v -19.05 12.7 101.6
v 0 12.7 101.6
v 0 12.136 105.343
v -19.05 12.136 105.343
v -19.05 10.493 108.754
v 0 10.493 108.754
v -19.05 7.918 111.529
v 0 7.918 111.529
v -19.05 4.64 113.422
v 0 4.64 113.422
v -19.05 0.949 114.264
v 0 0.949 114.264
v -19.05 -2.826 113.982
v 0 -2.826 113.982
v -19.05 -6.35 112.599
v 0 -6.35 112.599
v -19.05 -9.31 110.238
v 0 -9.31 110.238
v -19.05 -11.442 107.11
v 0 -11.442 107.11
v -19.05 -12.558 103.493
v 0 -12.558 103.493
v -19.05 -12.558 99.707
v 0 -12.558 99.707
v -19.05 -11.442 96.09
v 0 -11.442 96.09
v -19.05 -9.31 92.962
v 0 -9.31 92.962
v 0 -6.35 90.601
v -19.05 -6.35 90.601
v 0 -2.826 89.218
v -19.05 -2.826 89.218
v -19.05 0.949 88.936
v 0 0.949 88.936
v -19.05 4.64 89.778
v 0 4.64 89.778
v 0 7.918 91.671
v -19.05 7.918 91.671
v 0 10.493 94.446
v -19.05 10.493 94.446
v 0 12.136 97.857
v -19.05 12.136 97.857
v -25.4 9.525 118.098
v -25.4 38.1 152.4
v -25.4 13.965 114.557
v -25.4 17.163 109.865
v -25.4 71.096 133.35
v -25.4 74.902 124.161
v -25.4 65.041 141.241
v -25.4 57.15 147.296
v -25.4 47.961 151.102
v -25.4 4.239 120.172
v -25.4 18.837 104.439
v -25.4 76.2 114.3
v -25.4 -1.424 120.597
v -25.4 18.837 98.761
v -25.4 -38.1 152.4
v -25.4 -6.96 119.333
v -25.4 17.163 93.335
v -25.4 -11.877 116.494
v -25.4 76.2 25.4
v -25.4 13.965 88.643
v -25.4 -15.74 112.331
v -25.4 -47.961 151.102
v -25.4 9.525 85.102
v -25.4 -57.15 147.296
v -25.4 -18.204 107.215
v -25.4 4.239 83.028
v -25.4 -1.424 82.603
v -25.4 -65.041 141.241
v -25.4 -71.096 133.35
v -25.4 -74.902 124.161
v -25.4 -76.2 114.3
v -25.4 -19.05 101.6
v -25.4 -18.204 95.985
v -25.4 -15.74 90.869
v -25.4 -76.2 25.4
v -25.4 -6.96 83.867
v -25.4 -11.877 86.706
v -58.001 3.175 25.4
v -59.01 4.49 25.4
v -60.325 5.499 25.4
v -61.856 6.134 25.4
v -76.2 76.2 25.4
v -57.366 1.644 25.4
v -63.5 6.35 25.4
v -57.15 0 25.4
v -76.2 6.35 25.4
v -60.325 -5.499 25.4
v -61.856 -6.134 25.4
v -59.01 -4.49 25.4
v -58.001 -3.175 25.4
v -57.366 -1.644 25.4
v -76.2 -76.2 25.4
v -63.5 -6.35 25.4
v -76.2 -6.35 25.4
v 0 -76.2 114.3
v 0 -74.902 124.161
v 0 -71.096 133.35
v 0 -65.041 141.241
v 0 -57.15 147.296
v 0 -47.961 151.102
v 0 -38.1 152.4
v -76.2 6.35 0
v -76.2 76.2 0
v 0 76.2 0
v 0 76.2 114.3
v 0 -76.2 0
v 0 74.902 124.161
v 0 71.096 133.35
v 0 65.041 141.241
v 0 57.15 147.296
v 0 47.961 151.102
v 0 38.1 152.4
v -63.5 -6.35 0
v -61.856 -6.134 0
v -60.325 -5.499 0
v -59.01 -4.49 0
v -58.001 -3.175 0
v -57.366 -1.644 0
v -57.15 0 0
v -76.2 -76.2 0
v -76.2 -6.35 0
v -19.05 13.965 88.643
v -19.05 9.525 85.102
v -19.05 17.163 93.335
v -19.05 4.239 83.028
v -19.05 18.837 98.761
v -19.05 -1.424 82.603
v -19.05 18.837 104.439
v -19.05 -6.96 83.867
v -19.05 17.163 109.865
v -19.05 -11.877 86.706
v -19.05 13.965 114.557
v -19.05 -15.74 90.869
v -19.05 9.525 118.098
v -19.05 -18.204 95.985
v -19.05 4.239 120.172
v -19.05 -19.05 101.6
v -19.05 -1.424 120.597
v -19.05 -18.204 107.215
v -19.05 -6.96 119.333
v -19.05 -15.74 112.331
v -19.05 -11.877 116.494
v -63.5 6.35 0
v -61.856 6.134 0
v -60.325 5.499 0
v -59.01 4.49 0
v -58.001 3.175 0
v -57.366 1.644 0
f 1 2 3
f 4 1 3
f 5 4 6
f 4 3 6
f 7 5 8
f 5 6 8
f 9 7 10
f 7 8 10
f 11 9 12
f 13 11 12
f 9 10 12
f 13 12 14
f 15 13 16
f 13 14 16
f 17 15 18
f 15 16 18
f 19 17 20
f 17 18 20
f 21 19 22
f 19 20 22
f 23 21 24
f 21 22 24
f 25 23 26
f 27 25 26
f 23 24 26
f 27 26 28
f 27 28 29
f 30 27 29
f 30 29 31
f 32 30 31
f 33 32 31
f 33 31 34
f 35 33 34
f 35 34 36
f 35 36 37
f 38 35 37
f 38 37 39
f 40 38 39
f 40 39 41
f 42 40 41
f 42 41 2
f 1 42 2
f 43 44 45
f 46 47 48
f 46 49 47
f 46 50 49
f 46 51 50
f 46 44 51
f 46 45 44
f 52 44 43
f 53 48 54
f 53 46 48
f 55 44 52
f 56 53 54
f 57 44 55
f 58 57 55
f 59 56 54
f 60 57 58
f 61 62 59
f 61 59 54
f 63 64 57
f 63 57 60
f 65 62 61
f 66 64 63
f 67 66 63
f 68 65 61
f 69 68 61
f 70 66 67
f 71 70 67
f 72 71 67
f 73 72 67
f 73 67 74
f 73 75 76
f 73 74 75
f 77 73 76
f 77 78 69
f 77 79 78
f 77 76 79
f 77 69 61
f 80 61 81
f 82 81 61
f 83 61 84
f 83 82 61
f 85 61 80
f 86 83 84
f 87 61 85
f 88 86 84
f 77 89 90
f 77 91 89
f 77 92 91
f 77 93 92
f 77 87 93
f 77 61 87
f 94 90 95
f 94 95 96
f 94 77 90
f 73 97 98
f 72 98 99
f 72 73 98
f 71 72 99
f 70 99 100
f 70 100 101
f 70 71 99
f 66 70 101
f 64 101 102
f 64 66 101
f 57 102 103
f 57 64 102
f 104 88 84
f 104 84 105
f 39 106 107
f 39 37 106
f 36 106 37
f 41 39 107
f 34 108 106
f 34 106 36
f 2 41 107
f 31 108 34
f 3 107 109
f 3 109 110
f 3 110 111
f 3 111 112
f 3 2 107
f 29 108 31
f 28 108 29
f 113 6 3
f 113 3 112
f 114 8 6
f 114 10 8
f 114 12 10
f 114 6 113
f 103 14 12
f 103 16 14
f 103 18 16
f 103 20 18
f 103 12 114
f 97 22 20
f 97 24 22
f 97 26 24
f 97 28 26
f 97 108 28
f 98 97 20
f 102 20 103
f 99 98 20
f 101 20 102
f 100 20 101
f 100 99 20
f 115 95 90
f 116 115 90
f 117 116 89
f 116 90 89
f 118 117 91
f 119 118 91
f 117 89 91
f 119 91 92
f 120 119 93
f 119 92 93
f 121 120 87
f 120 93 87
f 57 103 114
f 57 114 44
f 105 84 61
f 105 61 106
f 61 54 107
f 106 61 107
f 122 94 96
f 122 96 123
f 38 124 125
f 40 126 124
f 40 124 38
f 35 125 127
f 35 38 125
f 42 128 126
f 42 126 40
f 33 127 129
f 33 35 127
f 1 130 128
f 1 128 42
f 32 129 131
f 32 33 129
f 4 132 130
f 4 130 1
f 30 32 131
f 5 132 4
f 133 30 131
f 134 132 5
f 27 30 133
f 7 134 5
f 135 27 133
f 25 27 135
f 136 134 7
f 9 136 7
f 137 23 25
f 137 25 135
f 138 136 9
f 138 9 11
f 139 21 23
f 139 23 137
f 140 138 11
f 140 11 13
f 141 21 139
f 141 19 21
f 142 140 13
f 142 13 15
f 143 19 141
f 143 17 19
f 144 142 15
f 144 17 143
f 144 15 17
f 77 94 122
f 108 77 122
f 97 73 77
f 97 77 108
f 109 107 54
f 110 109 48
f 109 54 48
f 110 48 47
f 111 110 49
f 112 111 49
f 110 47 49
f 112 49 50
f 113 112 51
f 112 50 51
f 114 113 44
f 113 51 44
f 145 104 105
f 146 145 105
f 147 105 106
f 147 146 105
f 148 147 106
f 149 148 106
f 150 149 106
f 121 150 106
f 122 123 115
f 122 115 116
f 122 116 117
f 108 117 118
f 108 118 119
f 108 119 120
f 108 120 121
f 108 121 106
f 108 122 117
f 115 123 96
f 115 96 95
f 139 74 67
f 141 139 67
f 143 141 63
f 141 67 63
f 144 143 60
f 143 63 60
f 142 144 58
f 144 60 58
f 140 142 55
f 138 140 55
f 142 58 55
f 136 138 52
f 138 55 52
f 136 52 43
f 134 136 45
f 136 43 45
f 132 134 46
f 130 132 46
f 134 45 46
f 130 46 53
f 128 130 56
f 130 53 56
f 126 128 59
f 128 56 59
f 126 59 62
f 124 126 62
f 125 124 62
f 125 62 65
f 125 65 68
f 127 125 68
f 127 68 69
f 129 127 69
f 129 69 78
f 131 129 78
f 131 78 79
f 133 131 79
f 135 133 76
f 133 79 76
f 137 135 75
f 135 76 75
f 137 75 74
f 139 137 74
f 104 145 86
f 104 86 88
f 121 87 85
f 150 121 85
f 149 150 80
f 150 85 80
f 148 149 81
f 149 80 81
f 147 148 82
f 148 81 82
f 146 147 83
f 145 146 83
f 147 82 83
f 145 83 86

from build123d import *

# Parameters (mm, degrees)
F1_DEPTH = 76.2
F2_R     = 12.7
F3_DEPTH = 76.201
F5_DEPTH = 25.401
F6_R     = 38.1
F7_R     = 19.05
F8_DEPTH = 6.35


with BuildPart() as f1:
    # F0 (on Front) → F1 (new body, symmetric)
    with BuildSketch(Plane.XZ):
        Polygon((-76.2, 0), (0, 0), (0, 152.4), (-25.4, 152.4), (-25.4, 25.4), (-76.2, 25.4), align=None)
    extrude(amount=F1_DEPTH, both=True)

    # F2 (on face) → F3 (cut, through all)
    with BuildSketch(Plane.YZ):
        with Locations((0, 101.6)):
            Circle(F2_R)
    extrude(amount=-F3_DEPTH, mode=Mode.SUBTRACT)

    # F4 (on face) → F5 (cut, through all)
    with BuildSketch(Plane.XY.offset(25.4)):
        with BuildLine():
            ThreePointArc((-63.5, -6.35), (-59.009872, -4.490128), (-57.15, 0))
            ThreePointArc((-57.15, 0), (-59.009872, 4.490128), (-63.5, 6.35))
            ThreePointArc((-63.5, 6.35), (-69.85, 0), (-63.5, -6.35))
        make_face()
        with BuildLine():
            ThreePointArc((-63.5, -6.35), (-69.85, 0), (-63.5, 6.35))
            Line((-63.5, 6.35), (-76.2, 6.35))
            Line((-76.2, 6.35), (-76.2, -6.35))
            Line((-76.2, -6.35), (-63.5, -6.35))
        make_face()
    extrude(amount=-F5_DEPTH, mode=Mode.SUBTRACT)

    # F6
    f6_edges = [f1.edges().sort_by_distance(p)[0] for p in [
        (-12.7, -76.2, 152.4),
        (-12.7, 76.2, 152.4),
    ]]
    fillet(f6_edges, radius=F6_R)

    # F7 (on face) → F8 (cut)
    with BuildSketch(Plane(origin=(-25.4, 0, 0), x_dir=(0, -1, 0), z_dir=(-1, 0, 0))):
        with Locations((0, 101.6)):
            Circle(F7_R)
    extrude(amount=-F8_DEPTH, mode=Mode.SUBTRACT)


solid = f1.part
